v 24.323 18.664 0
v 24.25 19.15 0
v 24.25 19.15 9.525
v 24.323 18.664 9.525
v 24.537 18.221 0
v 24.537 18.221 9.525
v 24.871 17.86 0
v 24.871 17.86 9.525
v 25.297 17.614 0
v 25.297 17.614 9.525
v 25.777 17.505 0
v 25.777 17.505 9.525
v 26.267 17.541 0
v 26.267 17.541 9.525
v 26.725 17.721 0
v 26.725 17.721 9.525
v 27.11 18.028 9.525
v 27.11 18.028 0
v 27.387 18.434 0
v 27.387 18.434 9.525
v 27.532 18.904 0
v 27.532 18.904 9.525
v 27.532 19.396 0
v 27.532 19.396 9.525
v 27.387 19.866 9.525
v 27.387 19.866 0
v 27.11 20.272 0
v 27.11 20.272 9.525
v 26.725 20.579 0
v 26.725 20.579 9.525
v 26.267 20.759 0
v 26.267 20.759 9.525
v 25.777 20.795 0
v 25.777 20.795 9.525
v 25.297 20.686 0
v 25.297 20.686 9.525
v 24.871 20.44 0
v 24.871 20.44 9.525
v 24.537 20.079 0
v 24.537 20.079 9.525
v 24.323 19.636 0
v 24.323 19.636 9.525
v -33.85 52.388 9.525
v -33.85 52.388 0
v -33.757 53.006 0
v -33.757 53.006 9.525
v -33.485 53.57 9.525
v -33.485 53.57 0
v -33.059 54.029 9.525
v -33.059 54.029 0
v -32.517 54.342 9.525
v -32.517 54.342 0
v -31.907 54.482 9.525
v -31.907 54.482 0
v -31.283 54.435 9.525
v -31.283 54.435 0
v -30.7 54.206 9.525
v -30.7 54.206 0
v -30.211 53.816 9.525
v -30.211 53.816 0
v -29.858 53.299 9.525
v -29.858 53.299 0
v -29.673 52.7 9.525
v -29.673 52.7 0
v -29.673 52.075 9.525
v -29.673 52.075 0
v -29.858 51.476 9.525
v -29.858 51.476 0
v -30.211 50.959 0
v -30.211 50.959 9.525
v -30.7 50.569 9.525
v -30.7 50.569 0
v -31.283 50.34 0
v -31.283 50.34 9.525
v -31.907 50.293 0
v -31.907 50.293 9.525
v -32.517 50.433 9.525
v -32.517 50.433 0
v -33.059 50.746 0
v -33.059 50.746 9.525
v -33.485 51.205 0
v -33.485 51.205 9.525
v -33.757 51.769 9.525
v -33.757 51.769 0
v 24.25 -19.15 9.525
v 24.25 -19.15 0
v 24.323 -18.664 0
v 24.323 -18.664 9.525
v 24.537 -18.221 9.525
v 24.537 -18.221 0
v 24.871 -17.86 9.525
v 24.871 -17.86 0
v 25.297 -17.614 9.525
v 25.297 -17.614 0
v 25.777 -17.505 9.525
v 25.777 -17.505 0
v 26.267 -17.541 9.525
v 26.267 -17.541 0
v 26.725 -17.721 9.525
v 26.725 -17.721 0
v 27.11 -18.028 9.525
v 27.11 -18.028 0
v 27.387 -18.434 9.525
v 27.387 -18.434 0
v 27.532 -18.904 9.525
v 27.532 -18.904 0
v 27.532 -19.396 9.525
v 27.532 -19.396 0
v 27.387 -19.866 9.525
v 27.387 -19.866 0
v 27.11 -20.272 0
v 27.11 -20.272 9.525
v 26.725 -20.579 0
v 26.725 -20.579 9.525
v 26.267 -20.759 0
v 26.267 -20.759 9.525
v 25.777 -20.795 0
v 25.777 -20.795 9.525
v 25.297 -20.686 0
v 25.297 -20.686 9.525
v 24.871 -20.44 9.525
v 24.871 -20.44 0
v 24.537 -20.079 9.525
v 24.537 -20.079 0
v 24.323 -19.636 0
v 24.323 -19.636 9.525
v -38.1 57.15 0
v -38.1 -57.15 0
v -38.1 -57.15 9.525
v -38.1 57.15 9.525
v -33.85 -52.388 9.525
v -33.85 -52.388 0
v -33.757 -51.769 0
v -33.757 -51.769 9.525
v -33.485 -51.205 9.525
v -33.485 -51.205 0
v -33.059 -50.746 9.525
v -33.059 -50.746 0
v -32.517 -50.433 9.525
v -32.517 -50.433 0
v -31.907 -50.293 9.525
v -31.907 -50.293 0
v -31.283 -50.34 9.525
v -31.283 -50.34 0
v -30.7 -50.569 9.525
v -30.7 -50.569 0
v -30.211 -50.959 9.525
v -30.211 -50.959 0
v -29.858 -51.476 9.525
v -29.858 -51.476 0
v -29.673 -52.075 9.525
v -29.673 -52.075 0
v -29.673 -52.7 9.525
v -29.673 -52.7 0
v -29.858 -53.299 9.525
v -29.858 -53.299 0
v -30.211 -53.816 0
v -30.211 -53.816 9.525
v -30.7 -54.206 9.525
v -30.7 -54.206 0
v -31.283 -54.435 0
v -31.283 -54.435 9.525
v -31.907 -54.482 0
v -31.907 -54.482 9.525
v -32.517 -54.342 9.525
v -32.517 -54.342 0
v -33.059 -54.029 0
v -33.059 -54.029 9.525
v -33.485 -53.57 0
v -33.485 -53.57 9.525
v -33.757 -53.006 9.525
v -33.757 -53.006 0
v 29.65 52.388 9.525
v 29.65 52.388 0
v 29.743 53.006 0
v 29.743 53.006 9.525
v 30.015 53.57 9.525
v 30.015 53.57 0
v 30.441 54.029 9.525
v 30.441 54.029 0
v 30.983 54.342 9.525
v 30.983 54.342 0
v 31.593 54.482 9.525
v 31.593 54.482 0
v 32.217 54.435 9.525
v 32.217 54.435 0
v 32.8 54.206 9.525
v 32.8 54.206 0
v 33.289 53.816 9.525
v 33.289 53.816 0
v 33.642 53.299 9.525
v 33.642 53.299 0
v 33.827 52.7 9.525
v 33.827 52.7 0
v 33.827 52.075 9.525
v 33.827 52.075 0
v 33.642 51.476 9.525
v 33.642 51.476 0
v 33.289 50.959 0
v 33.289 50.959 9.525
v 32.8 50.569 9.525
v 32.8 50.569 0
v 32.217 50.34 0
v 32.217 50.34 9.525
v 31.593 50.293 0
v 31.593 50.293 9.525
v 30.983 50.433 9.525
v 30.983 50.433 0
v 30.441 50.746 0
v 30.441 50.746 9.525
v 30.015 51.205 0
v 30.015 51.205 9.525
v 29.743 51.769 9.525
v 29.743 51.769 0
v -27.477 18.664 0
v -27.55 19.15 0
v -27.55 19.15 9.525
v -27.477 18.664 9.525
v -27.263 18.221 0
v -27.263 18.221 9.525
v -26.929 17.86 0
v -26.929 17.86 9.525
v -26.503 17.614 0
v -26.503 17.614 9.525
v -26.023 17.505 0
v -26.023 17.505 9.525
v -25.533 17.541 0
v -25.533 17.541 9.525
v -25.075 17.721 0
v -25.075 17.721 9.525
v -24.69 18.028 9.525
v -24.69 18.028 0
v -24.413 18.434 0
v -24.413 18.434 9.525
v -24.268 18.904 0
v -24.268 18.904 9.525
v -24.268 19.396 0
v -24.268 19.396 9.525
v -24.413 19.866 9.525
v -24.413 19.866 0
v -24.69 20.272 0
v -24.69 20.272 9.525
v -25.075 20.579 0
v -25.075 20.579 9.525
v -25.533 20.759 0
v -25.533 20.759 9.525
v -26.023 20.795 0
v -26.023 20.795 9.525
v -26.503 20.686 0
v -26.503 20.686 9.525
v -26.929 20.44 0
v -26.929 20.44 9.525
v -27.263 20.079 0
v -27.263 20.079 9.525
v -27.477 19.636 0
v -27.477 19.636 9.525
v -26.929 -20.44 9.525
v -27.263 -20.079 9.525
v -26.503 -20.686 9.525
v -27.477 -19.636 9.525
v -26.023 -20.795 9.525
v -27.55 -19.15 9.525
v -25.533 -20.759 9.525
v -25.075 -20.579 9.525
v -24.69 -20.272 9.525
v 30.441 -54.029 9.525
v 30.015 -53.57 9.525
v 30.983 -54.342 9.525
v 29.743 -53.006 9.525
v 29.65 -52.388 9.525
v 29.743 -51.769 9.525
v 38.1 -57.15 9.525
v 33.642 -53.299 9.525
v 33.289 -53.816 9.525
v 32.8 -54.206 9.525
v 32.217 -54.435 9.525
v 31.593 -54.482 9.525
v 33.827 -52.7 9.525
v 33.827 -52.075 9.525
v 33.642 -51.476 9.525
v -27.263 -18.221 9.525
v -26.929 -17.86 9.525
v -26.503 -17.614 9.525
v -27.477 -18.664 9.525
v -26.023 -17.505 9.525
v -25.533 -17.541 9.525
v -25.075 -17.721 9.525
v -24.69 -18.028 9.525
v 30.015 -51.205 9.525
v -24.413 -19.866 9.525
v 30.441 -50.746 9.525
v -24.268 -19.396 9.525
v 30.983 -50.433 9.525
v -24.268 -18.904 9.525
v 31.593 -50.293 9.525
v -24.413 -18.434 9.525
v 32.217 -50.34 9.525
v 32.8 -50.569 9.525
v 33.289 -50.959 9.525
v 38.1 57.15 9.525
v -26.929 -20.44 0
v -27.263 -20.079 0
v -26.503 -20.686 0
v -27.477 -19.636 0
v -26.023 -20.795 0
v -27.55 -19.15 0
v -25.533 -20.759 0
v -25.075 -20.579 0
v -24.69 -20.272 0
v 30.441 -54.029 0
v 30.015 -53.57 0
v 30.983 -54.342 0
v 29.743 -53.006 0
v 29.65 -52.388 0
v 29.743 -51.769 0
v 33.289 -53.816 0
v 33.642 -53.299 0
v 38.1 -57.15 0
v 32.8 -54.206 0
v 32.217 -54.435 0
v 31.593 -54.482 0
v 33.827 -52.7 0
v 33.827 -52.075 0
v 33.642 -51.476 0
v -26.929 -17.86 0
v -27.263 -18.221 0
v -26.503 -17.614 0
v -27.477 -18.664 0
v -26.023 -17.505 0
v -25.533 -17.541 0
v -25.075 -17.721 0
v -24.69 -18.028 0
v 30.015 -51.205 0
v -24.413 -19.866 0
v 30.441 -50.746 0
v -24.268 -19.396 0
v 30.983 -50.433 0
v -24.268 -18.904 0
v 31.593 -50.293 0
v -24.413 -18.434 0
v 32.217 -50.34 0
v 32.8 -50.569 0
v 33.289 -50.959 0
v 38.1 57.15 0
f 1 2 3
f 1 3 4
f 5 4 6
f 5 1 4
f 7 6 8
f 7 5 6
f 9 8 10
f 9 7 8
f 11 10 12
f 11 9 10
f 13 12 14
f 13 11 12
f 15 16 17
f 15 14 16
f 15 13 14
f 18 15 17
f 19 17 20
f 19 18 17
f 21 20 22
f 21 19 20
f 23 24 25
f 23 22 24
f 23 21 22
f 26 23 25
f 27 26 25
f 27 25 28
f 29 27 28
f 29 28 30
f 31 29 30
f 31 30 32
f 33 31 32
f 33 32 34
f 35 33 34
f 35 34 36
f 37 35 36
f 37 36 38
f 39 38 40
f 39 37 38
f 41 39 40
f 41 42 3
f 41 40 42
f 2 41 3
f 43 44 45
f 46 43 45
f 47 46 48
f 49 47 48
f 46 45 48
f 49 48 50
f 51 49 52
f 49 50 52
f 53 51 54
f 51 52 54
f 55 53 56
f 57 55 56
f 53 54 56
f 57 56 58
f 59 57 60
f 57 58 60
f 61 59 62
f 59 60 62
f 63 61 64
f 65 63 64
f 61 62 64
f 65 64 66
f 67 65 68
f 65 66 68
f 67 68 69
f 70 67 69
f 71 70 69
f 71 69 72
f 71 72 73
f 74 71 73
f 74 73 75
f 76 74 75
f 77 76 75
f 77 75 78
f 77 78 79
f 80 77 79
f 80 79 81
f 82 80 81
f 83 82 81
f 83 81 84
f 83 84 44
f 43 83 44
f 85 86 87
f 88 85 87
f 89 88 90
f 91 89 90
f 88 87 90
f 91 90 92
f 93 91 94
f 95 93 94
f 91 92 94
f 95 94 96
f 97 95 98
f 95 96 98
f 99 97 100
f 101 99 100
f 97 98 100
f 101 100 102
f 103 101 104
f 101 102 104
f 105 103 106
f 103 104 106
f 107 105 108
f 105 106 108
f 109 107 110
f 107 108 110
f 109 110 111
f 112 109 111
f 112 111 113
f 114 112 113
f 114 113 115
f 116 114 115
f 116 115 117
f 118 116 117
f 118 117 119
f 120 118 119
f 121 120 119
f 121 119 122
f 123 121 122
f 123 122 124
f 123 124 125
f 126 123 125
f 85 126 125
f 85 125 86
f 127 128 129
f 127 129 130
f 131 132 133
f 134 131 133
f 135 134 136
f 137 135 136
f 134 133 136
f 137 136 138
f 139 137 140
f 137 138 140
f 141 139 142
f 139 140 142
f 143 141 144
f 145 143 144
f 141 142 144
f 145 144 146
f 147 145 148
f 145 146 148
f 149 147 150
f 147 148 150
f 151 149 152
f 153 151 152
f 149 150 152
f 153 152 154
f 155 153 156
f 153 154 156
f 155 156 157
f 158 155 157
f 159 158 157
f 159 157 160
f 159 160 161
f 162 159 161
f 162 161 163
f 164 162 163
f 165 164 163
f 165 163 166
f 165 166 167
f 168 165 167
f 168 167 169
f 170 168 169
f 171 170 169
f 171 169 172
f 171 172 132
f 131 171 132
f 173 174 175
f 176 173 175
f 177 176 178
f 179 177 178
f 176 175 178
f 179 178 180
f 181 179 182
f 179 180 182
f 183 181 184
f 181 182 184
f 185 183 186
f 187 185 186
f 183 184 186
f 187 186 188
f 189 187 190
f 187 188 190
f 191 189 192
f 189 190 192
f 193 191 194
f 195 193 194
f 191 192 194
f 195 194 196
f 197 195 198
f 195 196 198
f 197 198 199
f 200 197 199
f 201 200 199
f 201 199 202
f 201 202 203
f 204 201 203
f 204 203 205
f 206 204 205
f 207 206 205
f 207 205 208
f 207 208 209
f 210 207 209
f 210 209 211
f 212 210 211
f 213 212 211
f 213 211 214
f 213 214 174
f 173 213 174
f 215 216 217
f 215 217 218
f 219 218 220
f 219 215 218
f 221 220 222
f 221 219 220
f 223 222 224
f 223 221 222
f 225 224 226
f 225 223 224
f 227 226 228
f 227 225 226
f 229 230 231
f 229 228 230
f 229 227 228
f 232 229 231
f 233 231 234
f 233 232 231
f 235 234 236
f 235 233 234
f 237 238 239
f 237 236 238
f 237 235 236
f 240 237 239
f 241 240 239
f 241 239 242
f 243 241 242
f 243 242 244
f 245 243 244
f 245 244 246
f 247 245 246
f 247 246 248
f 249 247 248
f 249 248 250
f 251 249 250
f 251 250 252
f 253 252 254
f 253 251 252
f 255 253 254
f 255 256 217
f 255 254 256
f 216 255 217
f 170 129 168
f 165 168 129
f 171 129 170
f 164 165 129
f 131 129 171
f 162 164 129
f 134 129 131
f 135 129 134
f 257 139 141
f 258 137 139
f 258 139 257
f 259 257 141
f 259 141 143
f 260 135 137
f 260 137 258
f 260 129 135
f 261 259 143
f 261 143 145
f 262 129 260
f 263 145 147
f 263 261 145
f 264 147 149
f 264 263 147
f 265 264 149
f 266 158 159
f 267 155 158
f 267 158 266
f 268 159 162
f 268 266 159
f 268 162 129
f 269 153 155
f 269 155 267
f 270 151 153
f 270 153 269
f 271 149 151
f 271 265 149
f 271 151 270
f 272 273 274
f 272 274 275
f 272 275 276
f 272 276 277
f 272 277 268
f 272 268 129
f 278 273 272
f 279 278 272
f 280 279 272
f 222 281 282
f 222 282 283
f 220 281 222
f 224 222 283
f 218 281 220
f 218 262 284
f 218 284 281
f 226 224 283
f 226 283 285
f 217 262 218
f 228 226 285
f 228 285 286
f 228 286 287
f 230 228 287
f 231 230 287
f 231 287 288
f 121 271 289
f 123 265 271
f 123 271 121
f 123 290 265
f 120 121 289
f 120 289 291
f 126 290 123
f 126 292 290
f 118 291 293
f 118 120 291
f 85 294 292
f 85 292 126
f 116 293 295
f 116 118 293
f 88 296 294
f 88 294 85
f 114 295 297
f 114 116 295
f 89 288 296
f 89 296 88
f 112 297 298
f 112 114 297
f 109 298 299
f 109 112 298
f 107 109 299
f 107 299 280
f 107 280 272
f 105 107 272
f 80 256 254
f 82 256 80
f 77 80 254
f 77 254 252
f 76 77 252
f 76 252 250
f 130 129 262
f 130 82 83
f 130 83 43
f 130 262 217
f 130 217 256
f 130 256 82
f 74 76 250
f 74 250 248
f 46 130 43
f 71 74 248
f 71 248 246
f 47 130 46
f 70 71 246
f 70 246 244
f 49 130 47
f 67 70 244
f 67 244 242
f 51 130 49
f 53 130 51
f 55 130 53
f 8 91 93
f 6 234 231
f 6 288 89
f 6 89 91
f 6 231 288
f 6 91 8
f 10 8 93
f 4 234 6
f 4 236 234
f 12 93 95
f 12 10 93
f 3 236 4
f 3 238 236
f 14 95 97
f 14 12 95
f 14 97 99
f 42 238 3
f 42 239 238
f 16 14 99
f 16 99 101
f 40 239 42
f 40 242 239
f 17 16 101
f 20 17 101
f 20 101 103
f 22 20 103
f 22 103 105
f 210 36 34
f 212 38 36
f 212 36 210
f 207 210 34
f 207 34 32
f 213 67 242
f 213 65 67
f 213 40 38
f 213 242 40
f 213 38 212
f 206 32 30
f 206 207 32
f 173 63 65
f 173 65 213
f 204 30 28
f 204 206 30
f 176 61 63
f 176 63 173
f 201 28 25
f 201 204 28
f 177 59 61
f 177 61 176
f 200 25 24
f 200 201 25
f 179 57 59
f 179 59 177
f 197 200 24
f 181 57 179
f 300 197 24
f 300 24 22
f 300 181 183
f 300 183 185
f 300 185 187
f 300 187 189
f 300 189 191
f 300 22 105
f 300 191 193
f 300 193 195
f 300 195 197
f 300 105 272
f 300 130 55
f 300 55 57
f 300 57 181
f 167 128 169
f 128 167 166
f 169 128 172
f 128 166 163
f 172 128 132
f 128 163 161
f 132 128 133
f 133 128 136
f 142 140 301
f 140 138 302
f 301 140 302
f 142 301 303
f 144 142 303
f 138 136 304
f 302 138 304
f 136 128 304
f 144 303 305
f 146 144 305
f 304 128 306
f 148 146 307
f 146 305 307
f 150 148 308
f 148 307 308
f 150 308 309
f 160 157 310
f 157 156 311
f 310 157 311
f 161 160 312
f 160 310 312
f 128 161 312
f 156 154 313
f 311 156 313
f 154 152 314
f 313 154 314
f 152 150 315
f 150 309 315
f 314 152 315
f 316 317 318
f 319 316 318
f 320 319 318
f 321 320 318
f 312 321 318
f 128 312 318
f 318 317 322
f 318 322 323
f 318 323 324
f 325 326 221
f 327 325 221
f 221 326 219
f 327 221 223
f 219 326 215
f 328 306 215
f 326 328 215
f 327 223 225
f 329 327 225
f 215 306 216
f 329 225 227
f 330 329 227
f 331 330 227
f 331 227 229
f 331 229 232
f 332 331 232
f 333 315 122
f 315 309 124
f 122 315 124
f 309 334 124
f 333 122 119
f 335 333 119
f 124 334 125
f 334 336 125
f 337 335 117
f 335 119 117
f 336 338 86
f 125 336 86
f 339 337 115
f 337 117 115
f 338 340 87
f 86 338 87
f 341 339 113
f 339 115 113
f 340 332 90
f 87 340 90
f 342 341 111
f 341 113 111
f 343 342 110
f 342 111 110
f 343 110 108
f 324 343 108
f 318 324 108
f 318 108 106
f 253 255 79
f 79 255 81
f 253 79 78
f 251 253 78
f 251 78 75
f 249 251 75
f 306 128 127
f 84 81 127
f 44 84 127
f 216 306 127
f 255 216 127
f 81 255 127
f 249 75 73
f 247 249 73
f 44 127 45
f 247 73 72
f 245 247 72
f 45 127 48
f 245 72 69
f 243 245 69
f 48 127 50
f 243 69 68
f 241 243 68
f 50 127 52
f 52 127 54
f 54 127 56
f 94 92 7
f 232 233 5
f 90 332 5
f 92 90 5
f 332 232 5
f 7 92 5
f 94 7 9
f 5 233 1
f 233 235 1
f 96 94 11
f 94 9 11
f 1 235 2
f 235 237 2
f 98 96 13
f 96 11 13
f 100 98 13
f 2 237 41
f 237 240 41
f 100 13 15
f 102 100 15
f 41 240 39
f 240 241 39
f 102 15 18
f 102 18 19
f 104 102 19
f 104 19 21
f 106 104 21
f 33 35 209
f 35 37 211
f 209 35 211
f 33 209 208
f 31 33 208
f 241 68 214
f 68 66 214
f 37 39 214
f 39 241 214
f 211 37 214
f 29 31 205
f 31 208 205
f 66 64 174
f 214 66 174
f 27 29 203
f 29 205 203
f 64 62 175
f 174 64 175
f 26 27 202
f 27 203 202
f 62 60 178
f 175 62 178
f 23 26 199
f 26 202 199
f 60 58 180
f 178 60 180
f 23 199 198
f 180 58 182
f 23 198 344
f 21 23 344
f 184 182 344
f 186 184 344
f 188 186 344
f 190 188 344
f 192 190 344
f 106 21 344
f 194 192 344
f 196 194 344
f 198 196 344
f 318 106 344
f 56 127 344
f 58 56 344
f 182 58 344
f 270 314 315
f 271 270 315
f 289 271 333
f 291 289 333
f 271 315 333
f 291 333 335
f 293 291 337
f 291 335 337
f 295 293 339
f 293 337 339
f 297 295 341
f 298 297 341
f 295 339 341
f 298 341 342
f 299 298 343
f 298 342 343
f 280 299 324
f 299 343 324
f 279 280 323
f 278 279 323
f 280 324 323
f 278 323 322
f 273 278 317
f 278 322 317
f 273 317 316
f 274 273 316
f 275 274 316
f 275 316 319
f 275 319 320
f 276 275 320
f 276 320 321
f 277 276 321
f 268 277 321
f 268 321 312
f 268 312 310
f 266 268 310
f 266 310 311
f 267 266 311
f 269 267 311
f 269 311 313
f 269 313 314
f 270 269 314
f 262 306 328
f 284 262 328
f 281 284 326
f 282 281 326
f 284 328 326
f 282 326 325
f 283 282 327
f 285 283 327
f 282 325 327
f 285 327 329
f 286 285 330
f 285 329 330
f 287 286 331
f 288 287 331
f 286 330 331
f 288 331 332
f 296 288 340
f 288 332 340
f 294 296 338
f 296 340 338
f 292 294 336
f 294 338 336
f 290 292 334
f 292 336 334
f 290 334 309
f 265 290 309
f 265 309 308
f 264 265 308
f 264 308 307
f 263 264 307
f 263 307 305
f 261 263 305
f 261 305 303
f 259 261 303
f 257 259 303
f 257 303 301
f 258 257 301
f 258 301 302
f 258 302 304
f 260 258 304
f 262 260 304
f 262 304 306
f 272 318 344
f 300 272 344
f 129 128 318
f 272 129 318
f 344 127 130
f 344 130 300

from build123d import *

# Parameters (mm, degrees)
F0_W     = 76.2
F0_H     = 114.3
F1_DEPTH = 9.525
F3_D     = 4.2
F6_D     = 3.3
F6_DEPTH = 12
F6_TIP   = 0.9914200214


# Not quite as in the source:
# - a pattern or mirror of a feature is missing from the dataset's text; its kind, count and spacing are read off the source's solid
# - a feature names something its author has since deleted; it is built from what else it names


with BuildPart() as f1:
    # F0 (on Top) → F1 (new body)
    with BuildSketch(Plane.XY):
        Rectangle(F0_W, F0_H)
    extrude(amount=F1_DEPTH)

    # F3 (through all)
    with Locations(Plane.XY.offset(9.525)):
        with Locations((-31.75, 52.3875), (31.75, 52.3875), (31.75, -52.3875), (-31.75, -52.3875)):
            Hole(F3_D / 2)

    # F6
    with Locations(Plane.XY.offset(9.525)):
        with Locations((-25.9, -19.15), (25.9, -19.15)):
            f6 = Hole(F6_D / 2, depth=F6_DEPTH)
            with Locations((0, 0, -(F6_DEPTH + F6_TIP / 2))):  # 118° drill point
                Cone(0, F6_D / 2, F6_TIP, mode=Mode.SUBTRACT)

    # F6_copies: F6 across plane
    add(f6.mirror(Plane.ZX), mode=Mode.SUBTRACT)


solid = f1.part
